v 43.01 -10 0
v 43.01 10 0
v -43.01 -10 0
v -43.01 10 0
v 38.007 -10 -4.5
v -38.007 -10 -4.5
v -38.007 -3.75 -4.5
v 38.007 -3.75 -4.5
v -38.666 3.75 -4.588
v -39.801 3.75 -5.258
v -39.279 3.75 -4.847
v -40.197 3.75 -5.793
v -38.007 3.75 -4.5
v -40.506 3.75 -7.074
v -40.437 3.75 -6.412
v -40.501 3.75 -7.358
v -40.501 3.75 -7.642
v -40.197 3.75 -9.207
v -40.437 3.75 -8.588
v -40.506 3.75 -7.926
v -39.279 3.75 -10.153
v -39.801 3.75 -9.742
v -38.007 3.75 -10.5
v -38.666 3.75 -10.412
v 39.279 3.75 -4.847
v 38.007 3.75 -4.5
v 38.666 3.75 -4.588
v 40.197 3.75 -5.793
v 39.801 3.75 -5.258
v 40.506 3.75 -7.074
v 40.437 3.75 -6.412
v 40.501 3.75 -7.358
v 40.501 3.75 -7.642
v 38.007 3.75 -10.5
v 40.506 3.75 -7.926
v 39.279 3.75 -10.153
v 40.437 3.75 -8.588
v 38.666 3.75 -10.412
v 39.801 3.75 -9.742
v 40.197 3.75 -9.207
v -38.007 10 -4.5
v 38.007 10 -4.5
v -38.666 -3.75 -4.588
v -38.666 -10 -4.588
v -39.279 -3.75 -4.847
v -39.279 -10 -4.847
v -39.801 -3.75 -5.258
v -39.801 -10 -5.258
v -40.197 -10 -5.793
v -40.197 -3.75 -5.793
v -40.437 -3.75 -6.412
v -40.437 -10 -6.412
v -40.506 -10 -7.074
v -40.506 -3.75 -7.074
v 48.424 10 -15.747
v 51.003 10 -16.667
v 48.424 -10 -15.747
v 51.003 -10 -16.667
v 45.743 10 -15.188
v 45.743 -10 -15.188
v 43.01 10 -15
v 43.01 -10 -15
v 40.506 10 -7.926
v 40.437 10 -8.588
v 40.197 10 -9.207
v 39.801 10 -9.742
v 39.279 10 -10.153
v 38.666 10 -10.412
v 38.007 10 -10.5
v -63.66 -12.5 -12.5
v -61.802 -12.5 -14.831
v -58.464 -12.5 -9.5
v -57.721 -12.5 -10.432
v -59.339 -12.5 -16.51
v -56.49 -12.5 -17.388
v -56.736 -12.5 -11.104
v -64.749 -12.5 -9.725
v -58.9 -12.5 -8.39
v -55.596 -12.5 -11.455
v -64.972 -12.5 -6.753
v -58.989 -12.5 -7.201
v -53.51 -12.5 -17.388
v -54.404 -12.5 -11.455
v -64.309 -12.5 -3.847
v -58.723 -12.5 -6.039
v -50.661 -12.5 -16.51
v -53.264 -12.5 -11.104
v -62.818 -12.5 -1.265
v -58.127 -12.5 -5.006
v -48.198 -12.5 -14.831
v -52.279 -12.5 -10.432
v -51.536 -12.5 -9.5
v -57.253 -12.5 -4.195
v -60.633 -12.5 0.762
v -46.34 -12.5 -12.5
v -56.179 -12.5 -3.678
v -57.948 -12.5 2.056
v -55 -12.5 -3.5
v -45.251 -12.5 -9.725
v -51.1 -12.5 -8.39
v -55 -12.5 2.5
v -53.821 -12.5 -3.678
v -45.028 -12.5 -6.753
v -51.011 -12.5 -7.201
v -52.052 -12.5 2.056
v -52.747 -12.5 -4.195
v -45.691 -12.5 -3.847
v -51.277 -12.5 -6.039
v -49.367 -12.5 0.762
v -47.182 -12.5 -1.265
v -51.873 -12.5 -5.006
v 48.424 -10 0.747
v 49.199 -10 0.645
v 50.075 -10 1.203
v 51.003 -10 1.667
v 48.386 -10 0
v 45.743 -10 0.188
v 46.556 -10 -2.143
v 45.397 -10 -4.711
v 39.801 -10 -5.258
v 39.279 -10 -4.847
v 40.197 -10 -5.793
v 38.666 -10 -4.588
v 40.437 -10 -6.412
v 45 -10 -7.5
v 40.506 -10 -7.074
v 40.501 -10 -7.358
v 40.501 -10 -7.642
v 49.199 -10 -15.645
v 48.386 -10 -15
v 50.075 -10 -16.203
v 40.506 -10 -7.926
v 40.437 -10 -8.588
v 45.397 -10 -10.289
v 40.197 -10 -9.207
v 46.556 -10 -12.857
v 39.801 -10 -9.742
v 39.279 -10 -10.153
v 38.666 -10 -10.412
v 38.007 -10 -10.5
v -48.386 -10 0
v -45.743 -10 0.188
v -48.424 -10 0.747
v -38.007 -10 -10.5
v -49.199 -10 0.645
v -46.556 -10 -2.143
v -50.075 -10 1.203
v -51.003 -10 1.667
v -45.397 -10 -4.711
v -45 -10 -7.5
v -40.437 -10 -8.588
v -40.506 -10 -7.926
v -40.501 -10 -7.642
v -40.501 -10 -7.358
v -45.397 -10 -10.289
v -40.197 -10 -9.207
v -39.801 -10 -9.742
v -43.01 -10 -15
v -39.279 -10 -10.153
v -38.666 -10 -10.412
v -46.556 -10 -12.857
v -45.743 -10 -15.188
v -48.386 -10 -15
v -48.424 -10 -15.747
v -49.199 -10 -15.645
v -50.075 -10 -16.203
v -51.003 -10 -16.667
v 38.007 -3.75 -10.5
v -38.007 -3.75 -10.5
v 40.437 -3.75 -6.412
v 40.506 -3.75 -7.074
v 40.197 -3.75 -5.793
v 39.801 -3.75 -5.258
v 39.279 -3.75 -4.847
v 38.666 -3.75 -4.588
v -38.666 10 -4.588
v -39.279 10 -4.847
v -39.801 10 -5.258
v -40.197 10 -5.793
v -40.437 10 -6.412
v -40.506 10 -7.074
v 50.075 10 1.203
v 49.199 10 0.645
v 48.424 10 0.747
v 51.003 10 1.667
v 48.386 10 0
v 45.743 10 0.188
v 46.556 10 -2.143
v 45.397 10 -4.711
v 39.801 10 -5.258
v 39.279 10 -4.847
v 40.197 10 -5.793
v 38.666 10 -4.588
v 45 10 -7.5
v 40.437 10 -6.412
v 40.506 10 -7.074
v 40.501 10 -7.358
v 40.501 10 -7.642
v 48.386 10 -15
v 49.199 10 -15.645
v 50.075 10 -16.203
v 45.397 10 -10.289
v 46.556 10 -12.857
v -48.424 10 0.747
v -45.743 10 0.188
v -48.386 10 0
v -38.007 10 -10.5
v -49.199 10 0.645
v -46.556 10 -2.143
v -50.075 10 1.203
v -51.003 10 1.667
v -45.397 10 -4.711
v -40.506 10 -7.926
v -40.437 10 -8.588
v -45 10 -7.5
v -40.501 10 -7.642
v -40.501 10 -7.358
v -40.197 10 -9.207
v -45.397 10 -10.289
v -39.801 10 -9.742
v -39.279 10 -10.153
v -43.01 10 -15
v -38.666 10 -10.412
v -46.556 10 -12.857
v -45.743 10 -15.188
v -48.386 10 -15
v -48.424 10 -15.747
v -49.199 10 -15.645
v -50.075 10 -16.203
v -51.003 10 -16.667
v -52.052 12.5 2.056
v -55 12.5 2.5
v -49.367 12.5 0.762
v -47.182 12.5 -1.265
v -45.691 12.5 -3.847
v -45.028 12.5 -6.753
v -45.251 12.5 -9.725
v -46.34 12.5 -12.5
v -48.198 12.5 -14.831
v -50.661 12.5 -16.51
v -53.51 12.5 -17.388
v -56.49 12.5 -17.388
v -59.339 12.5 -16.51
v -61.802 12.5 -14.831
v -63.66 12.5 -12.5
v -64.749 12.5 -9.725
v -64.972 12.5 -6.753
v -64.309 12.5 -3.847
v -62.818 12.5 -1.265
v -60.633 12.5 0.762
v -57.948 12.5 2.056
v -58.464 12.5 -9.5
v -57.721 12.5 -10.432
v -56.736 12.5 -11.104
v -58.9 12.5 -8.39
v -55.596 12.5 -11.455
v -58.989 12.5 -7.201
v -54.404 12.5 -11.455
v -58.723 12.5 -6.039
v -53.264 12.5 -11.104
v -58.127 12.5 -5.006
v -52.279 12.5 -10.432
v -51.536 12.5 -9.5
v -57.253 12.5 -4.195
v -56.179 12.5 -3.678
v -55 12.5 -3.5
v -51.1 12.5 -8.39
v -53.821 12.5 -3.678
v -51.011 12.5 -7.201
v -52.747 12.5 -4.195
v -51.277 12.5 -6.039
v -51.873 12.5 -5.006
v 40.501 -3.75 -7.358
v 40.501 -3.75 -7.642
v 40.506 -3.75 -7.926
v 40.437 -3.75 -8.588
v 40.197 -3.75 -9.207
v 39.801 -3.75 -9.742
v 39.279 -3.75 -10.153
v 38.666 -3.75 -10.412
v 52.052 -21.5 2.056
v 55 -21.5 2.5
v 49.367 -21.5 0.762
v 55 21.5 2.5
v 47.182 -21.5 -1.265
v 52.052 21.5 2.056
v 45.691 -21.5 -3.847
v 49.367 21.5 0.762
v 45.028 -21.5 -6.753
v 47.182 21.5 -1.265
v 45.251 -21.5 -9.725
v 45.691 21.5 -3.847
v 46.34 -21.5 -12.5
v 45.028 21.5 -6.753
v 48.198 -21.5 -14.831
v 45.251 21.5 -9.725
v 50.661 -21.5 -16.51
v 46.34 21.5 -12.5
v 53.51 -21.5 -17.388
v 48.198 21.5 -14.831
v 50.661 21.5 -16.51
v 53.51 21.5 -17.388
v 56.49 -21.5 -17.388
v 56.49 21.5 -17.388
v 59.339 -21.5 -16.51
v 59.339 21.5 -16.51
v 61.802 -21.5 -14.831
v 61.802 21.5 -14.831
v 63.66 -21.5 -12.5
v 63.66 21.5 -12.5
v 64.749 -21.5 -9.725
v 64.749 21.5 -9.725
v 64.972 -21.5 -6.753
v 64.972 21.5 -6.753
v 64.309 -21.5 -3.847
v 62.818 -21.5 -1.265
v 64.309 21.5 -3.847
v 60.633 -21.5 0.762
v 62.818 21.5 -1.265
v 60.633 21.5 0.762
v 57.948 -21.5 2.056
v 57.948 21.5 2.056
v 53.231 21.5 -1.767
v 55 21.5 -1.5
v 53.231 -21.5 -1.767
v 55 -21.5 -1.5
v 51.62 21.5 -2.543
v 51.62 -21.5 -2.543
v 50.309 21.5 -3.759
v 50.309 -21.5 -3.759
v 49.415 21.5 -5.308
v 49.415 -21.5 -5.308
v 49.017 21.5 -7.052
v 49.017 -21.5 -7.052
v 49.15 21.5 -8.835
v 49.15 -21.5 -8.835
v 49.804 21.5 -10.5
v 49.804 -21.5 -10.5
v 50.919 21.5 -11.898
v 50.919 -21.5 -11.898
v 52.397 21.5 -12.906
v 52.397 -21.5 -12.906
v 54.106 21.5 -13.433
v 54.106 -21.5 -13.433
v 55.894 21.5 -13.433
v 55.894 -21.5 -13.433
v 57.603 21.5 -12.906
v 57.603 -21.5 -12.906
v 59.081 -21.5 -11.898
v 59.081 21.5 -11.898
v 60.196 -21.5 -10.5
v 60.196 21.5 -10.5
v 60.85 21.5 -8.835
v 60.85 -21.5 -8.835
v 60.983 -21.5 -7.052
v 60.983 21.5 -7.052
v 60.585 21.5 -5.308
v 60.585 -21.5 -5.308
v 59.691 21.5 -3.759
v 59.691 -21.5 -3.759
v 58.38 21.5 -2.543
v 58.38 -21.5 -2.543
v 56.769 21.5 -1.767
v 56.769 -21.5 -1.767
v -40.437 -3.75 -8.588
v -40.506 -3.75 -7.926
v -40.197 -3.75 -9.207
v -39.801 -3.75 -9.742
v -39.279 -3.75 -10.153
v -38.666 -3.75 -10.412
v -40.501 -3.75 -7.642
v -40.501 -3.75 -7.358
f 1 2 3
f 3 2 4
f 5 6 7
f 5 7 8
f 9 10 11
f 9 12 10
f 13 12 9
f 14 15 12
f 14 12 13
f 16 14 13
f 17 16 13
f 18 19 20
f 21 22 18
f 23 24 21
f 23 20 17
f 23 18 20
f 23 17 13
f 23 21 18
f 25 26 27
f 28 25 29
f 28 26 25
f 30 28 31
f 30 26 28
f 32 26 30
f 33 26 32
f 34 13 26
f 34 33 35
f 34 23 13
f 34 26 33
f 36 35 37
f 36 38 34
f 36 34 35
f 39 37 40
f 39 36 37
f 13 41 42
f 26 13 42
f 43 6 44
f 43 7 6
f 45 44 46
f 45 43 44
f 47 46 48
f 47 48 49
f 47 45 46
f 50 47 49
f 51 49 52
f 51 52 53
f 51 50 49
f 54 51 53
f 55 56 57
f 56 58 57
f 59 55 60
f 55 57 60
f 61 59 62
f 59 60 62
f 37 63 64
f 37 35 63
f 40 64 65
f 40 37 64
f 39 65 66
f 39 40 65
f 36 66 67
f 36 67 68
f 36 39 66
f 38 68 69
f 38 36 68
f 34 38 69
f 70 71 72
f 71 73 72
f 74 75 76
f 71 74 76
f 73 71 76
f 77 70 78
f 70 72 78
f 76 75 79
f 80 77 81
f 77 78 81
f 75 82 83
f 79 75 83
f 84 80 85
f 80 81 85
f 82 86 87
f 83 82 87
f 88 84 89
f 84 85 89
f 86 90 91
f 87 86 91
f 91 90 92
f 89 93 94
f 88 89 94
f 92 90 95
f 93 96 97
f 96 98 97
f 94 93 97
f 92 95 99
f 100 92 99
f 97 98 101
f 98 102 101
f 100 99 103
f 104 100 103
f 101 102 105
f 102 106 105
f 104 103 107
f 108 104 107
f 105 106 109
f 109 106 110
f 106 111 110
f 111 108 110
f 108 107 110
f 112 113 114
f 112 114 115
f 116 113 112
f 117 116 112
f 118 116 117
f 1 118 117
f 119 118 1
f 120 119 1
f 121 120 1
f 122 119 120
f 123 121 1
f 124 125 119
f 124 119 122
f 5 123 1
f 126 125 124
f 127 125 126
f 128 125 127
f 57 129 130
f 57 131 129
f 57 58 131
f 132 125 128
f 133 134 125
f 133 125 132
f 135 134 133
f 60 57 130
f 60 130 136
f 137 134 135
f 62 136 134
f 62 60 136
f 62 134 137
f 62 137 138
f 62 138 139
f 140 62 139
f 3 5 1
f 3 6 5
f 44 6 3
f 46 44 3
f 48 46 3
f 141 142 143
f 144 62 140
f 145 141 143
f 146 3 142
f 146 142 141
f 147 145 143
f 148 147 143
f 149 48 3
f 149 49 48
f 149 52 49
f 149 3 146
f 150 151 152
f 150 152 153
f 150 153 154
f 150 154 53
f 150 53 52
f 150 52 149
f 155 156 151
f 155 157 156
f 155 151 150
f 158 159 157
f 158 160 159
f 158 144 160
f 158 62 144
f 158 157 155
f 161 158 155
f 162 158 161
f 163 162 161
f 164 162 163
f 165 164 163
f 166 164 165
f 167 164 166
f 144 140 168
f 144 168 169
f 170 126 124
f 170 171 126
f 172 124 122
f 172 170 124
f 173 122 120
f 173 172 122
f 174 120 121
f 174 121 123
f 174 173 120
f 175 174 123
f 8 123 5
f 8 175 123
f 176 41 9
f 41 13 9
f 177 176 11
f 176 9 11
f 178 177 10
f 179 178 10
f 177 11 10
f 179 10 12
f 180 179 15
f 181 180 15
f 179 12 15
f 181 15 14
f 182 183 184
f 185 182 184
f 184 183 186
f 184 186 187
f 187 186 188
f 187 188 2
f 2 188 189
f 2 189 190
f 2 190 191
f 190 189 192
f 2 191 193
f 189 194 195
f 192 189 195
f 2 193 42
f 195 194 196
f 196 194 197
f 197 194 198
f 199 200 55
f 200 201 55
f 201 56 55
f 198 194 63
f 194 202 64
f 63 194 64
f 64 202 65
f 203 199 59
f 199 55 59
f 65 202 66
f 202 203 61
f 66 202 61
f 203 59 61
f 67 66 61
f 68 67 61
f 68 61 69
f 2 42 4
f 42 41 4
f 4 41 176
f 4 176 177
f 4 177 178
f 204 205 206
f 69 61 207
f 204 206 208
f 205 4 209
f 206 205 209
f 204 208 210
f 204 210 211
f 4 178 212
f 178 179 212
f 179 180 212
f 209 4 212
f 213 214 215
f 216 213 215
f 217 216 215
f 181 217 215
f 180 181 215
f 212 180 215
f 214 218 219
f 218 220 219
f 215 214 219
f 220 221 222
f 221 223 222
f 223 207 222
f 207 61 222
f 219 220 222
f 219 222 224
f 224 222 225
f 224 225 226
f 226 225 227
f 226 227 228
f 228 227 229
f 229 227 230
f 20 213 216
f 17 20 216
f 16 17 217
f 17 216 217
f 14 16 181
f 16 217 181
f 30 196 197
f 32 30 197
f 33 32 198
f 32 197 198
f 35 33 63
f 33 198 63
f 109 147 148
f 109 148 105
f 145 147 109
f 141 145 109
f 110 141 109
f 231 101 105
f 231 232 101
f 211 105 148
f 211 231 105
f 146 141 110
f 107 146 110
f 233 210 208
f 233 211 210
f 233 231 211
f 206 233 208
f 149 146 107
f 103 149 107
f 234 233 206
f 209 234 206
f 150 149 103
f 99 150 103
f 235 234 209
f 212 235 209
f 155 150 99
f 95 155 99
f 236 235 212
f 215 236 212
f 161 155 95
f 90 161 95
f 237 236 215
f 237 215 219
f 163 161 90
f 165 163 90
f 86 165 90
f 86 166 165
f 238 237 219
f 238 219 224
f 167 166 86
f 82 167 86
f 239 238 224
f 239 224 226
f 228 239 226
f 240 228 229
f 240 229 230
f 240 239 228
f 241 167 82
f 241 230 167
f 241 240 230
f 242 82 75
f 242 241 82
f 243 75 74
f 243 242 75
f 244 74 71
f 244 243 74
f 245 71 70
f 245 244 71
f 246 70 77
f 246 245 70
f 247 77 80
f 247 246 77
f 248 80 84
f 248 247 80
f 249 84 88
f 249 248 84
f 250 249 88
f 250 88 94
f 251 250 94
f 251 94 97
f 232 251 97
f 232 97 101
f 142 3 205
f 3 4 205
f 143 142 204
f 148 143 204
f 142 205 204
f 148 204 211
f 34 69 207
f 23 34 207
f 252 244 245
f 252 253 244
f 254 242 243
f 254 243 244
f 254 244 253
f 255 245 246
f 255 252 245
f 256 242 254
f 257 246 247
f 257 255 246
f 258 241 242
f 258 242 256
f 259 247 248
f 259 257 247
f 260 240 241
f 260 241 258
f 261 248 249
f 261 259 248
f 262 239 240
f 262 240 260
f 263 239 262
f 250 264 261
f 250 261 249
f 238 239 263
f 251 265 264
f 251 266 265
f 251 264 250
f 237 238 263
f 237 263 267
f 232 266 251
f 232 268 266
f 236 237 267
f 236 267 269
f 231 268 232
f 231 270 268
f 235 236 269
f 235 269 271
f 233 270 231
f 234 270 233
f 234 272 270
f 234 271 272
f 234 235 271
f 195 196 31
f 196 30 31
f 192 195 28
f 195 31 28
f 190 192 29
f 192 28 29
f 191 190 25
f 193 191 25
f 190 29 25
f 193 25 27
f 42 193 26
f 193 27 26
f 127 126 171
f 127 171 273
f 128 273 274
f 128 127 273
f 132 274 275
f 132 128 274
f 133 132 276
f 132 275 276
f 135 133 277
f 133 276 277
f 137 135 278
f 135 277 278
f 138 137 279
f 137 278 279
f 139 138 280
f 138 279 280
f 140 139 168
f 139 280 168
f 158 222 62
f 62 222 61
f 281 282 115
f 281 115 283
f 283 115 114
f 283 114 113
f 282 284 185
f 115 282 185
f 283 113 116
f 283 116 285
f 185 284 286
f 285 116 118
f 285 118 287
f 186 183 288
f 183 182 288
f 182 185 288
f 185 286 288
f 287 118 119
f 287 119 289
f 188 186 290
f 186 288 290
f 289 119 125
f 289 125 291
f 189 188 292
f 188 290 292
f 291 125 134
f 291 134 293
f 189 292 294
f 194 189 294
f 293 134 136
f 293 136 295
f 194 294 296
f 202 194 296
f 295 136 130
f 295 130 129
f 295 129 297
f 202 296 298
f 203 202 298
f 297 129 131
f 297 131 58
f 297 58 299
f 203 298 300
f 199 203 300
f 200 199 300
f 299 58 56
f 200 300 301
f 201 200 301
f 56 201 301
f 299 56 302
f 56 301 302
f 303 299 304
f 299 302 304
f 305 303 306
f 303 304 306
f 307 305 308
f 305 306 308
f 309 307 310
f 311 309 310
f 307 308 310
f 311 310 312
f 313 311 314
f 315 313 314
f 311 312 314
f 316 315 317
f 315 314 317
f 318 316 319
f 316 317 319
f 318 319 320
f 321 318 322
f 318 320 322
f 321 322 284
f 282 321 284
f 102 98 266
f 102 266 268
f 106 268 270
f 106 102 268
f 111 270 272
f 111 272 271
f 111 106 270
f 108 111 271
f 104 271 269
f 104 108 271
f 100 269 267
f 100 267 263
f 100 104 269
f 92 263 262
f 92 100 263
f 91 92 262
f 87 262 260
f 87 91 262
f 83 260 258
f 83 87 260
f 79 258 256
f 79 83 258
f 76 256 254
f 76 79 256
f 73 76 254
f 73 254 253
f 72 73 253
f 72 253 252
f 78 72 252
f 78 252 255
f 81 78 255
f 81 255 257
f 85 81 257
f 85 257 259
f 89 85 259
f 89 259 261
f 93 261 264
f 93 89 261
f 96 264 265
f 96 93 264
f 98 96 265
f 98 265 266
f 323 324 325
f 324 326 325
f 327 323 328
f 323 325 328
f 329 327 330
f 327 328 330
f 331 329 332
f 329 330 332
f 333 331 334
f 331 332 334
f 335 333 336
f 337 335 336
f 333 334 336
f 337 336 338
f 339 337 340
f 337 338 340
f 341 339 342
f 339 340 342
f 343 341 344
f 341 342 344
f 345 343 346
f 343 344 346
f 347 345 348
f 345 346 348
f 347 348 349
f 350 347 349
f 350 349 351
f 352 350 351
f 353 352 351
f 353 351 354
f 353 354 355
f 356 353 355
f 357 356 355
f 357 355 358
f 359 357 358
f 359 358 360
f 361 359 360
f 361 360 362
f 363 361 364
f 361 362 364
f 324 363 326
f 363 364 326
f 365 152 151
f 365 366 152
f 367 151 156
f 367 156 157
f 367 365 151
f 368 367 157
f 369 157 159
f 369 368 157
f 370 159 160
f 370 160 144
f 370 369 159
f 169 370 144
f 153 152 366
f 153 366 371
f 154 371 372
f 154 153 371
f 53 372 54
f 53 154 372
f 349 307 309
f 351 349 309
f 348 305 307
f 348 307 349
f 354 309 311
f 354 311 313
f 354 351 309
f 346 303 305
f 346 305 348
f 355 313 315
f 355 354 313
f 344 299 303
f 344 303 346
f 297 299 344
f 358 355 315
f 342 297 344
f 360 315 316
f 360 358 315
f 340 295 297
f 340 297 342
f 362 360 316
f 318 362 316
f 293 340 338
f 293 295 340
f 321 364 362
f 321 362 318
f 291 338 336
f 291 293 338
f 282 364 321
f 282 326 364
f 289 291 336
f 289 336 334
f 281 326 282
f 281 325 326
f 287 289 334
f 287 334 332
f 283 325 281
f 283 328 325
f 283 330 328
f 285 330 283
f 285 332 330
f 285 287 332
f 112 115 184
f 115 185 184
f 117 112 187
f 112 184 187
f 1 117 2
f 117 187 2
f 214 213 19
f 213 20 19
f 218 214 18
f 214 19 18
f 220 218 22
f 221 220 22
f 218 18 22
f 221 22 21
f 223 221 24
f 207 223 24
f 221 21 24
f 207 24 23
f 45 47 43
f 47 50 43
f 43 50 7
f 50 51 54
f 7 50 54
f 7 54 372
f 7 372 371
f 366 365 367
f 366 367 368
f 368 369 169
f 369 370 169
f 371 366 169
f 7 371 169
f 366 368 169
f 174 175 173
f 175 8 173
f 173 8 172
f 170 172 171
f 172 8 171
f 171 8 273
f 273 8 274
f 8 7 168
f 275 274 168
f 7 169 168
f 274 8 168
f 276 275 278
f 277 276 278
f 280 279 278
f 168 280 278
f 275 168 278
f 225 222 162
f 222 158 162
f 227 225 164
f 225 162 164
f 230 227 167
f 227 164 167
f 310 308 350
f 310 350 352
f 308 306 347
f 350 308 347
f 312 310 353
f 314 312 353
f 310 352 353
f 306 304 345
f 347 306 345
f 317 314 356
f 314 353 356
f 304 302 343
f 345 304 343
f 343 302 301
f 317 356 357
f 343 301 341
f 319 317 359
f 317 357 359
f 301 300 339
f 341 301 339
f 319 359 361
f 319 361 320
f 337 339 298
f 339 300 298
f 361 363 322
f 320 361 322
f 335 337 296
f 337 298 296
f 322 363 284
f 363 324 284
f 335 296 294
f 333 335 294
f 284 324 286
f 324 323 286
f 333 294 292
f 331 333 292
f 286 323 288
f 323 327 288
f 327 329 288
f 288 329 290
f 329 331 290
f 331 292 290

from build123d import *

# Parameters (mm, degrees)
SKETCH2_R           = 10
SKETCH2_R_2         = 6
BOSS_EXTRUDE1_DEPTH = 21.5
BOSS_EXTRUDE2_DEPTH = 10
CUT_EXTRUDE1_DEPTH  = 6.25
FILLET1_R           = 20
FILLET2_R           = 2.5
MOVE_FACE1_BY       = 9
MOVE_FACE2_BY       = 9
MOVE_FACE3_BY       = 2


with BuildPart() as part:
    # Sketch2 → Boss-Extrude1 (new, symmetric)
    with BuildSketch(Plane(origin=(0, 0, 0), x_dir=(1, 0, 0), z_dir=(0, 1, 0))):
        with Locations(Location((-55, 7.5, 0), (0, 0, 270))):
            Circle(SKETCH2_R)
        with Locations(Location((-55, 7.5, 0), (0, 0, 270))):
            Circle(SKETCH2_R_2, mode=Mode.SUBTRACT)
    extrude(amount=BOSS_EXTRUDE1_DEPTH, both=True)

    # Sketch2<3> → Boss-Extrude2 (add, symmetric)
    with BuildSketch(Plane(origin=(0, 0, 0), x_dir=(1, 0, 0), z_dir=(0, 1, 0))):
        with BuildLine():
            Line((0, 0), (0, 7.5))
            Line((0, 7.5), (-45, 7.5))
            ThreePointArc((-45, 7.5), (-45.885621722, 3.385621722), (-48.385621722, 0))
            Line((-48.385621722, 0), (0, 0))
        make_face()
        with BuildLine():
            Line((-45, 7.5), (0, 7.5))
            Line((0, 7.5), (0, 15))
            Line((0, 15), (-48.385621722, 15))
            ThreePointArc((-48.385621722, 15), (-45.885621722, 11.614378278), (-45, 7.5))
        make_face()
    extrude(amount=BOSS_EXTRUDE2_DEPTH, both=True)

    # Mirror1: part across plane


with BuildPart() as part_1:
    add(part.part)
    add(part.part.mirror(Plane(origin=(0, 10, 0), x_dir=(0, 0, 1), z_dir=(-1, 0, 0))))

    # Sketch3 → Cut-Extrude1 (cut)
    with BuildSketch(Plane(origin=(0, 10, 0), x_dir=(1, 0, 0), z_dir=(0, 1, 0))):
        with BuildLine():
            Line((40.813739041, 10.5), (-40.813739041, 10.5))
            ThreePointArc((-40.813739041, 10.5), (-40.5, 7.5), (-40.813739041, 4.5))
            Line((-40.813739041, 4.5), (40.813739041, 4.5))
            ThreePointArc((40.813739041, 4.5), (40.5, 7.5), (40.813739041, 10.5))
        make_face()
    cut_extrude1 = extrude(amount=-CUT_EXTRUDE1_DEPTH, mode=Mode.SUBTRACT)

    # Mirror2: Cut-Extrude1 across plane
    add(cut_extrude1.mirror(Plane.ZX), mode=Mode.SUBTRACT)

    # Fillet1
    fillet1_edges = [part_1.edges().sort_by_distance(p)[0] for p in [
        (-48.385621722, 0, -15),
        (-48.385621722, 0, 0),
        (48.385621722, 0, 0),
        (48.385621722, 0, -15),
    ]]
    fillet(fillet1_edges, radius=FILLET1_R)

    # Fillet2
    fillet2_edges = [part_1.edges().sort_by_distance(p)[0] for p in [
        (-40.813739041, 6.875, -4.5),
        (-40.813739041, 6.875, -10.5),
        (40.813739041, 6.875, -10.5),
        (40.813739041, 6.875, -4.5),
        (-40.813739041, -6.875, -10.5),
        (-40.813739041, -6.875, -4.5),
        (40.813739041, -6.875, -4.5),
        (40.813739041, -6.875, -10.5),
    ]]
    fillet(fillet2_edges, radius=FILLET2_R)

    # Move Face1: a face moved inward by 9.0
    extrude(part_1.faces().sort_by_distance((-55, 21.5, 0.5))[0], amount=MOVE_FACE1_BY, dir=(0, -1, 0), mode=Mode.SUBTRACT)

    # Move Face2: a face moved inward by 9.0
    extrude(part_1.faces().sort_by_distance((-55, -21.5, 0.5))[0], amount=MOVE_FACE2_BY, dir=(0, 1, 0), mode=Mode.SUBTRACT)

    # Move Face3: a curved face moved outward by 2.0
    add(Solid.thicken(part_1.faces().sort_by_distance((-55, 0, -13.5))[0], MOVE_FACE3_BY))


solid = part_1.part
